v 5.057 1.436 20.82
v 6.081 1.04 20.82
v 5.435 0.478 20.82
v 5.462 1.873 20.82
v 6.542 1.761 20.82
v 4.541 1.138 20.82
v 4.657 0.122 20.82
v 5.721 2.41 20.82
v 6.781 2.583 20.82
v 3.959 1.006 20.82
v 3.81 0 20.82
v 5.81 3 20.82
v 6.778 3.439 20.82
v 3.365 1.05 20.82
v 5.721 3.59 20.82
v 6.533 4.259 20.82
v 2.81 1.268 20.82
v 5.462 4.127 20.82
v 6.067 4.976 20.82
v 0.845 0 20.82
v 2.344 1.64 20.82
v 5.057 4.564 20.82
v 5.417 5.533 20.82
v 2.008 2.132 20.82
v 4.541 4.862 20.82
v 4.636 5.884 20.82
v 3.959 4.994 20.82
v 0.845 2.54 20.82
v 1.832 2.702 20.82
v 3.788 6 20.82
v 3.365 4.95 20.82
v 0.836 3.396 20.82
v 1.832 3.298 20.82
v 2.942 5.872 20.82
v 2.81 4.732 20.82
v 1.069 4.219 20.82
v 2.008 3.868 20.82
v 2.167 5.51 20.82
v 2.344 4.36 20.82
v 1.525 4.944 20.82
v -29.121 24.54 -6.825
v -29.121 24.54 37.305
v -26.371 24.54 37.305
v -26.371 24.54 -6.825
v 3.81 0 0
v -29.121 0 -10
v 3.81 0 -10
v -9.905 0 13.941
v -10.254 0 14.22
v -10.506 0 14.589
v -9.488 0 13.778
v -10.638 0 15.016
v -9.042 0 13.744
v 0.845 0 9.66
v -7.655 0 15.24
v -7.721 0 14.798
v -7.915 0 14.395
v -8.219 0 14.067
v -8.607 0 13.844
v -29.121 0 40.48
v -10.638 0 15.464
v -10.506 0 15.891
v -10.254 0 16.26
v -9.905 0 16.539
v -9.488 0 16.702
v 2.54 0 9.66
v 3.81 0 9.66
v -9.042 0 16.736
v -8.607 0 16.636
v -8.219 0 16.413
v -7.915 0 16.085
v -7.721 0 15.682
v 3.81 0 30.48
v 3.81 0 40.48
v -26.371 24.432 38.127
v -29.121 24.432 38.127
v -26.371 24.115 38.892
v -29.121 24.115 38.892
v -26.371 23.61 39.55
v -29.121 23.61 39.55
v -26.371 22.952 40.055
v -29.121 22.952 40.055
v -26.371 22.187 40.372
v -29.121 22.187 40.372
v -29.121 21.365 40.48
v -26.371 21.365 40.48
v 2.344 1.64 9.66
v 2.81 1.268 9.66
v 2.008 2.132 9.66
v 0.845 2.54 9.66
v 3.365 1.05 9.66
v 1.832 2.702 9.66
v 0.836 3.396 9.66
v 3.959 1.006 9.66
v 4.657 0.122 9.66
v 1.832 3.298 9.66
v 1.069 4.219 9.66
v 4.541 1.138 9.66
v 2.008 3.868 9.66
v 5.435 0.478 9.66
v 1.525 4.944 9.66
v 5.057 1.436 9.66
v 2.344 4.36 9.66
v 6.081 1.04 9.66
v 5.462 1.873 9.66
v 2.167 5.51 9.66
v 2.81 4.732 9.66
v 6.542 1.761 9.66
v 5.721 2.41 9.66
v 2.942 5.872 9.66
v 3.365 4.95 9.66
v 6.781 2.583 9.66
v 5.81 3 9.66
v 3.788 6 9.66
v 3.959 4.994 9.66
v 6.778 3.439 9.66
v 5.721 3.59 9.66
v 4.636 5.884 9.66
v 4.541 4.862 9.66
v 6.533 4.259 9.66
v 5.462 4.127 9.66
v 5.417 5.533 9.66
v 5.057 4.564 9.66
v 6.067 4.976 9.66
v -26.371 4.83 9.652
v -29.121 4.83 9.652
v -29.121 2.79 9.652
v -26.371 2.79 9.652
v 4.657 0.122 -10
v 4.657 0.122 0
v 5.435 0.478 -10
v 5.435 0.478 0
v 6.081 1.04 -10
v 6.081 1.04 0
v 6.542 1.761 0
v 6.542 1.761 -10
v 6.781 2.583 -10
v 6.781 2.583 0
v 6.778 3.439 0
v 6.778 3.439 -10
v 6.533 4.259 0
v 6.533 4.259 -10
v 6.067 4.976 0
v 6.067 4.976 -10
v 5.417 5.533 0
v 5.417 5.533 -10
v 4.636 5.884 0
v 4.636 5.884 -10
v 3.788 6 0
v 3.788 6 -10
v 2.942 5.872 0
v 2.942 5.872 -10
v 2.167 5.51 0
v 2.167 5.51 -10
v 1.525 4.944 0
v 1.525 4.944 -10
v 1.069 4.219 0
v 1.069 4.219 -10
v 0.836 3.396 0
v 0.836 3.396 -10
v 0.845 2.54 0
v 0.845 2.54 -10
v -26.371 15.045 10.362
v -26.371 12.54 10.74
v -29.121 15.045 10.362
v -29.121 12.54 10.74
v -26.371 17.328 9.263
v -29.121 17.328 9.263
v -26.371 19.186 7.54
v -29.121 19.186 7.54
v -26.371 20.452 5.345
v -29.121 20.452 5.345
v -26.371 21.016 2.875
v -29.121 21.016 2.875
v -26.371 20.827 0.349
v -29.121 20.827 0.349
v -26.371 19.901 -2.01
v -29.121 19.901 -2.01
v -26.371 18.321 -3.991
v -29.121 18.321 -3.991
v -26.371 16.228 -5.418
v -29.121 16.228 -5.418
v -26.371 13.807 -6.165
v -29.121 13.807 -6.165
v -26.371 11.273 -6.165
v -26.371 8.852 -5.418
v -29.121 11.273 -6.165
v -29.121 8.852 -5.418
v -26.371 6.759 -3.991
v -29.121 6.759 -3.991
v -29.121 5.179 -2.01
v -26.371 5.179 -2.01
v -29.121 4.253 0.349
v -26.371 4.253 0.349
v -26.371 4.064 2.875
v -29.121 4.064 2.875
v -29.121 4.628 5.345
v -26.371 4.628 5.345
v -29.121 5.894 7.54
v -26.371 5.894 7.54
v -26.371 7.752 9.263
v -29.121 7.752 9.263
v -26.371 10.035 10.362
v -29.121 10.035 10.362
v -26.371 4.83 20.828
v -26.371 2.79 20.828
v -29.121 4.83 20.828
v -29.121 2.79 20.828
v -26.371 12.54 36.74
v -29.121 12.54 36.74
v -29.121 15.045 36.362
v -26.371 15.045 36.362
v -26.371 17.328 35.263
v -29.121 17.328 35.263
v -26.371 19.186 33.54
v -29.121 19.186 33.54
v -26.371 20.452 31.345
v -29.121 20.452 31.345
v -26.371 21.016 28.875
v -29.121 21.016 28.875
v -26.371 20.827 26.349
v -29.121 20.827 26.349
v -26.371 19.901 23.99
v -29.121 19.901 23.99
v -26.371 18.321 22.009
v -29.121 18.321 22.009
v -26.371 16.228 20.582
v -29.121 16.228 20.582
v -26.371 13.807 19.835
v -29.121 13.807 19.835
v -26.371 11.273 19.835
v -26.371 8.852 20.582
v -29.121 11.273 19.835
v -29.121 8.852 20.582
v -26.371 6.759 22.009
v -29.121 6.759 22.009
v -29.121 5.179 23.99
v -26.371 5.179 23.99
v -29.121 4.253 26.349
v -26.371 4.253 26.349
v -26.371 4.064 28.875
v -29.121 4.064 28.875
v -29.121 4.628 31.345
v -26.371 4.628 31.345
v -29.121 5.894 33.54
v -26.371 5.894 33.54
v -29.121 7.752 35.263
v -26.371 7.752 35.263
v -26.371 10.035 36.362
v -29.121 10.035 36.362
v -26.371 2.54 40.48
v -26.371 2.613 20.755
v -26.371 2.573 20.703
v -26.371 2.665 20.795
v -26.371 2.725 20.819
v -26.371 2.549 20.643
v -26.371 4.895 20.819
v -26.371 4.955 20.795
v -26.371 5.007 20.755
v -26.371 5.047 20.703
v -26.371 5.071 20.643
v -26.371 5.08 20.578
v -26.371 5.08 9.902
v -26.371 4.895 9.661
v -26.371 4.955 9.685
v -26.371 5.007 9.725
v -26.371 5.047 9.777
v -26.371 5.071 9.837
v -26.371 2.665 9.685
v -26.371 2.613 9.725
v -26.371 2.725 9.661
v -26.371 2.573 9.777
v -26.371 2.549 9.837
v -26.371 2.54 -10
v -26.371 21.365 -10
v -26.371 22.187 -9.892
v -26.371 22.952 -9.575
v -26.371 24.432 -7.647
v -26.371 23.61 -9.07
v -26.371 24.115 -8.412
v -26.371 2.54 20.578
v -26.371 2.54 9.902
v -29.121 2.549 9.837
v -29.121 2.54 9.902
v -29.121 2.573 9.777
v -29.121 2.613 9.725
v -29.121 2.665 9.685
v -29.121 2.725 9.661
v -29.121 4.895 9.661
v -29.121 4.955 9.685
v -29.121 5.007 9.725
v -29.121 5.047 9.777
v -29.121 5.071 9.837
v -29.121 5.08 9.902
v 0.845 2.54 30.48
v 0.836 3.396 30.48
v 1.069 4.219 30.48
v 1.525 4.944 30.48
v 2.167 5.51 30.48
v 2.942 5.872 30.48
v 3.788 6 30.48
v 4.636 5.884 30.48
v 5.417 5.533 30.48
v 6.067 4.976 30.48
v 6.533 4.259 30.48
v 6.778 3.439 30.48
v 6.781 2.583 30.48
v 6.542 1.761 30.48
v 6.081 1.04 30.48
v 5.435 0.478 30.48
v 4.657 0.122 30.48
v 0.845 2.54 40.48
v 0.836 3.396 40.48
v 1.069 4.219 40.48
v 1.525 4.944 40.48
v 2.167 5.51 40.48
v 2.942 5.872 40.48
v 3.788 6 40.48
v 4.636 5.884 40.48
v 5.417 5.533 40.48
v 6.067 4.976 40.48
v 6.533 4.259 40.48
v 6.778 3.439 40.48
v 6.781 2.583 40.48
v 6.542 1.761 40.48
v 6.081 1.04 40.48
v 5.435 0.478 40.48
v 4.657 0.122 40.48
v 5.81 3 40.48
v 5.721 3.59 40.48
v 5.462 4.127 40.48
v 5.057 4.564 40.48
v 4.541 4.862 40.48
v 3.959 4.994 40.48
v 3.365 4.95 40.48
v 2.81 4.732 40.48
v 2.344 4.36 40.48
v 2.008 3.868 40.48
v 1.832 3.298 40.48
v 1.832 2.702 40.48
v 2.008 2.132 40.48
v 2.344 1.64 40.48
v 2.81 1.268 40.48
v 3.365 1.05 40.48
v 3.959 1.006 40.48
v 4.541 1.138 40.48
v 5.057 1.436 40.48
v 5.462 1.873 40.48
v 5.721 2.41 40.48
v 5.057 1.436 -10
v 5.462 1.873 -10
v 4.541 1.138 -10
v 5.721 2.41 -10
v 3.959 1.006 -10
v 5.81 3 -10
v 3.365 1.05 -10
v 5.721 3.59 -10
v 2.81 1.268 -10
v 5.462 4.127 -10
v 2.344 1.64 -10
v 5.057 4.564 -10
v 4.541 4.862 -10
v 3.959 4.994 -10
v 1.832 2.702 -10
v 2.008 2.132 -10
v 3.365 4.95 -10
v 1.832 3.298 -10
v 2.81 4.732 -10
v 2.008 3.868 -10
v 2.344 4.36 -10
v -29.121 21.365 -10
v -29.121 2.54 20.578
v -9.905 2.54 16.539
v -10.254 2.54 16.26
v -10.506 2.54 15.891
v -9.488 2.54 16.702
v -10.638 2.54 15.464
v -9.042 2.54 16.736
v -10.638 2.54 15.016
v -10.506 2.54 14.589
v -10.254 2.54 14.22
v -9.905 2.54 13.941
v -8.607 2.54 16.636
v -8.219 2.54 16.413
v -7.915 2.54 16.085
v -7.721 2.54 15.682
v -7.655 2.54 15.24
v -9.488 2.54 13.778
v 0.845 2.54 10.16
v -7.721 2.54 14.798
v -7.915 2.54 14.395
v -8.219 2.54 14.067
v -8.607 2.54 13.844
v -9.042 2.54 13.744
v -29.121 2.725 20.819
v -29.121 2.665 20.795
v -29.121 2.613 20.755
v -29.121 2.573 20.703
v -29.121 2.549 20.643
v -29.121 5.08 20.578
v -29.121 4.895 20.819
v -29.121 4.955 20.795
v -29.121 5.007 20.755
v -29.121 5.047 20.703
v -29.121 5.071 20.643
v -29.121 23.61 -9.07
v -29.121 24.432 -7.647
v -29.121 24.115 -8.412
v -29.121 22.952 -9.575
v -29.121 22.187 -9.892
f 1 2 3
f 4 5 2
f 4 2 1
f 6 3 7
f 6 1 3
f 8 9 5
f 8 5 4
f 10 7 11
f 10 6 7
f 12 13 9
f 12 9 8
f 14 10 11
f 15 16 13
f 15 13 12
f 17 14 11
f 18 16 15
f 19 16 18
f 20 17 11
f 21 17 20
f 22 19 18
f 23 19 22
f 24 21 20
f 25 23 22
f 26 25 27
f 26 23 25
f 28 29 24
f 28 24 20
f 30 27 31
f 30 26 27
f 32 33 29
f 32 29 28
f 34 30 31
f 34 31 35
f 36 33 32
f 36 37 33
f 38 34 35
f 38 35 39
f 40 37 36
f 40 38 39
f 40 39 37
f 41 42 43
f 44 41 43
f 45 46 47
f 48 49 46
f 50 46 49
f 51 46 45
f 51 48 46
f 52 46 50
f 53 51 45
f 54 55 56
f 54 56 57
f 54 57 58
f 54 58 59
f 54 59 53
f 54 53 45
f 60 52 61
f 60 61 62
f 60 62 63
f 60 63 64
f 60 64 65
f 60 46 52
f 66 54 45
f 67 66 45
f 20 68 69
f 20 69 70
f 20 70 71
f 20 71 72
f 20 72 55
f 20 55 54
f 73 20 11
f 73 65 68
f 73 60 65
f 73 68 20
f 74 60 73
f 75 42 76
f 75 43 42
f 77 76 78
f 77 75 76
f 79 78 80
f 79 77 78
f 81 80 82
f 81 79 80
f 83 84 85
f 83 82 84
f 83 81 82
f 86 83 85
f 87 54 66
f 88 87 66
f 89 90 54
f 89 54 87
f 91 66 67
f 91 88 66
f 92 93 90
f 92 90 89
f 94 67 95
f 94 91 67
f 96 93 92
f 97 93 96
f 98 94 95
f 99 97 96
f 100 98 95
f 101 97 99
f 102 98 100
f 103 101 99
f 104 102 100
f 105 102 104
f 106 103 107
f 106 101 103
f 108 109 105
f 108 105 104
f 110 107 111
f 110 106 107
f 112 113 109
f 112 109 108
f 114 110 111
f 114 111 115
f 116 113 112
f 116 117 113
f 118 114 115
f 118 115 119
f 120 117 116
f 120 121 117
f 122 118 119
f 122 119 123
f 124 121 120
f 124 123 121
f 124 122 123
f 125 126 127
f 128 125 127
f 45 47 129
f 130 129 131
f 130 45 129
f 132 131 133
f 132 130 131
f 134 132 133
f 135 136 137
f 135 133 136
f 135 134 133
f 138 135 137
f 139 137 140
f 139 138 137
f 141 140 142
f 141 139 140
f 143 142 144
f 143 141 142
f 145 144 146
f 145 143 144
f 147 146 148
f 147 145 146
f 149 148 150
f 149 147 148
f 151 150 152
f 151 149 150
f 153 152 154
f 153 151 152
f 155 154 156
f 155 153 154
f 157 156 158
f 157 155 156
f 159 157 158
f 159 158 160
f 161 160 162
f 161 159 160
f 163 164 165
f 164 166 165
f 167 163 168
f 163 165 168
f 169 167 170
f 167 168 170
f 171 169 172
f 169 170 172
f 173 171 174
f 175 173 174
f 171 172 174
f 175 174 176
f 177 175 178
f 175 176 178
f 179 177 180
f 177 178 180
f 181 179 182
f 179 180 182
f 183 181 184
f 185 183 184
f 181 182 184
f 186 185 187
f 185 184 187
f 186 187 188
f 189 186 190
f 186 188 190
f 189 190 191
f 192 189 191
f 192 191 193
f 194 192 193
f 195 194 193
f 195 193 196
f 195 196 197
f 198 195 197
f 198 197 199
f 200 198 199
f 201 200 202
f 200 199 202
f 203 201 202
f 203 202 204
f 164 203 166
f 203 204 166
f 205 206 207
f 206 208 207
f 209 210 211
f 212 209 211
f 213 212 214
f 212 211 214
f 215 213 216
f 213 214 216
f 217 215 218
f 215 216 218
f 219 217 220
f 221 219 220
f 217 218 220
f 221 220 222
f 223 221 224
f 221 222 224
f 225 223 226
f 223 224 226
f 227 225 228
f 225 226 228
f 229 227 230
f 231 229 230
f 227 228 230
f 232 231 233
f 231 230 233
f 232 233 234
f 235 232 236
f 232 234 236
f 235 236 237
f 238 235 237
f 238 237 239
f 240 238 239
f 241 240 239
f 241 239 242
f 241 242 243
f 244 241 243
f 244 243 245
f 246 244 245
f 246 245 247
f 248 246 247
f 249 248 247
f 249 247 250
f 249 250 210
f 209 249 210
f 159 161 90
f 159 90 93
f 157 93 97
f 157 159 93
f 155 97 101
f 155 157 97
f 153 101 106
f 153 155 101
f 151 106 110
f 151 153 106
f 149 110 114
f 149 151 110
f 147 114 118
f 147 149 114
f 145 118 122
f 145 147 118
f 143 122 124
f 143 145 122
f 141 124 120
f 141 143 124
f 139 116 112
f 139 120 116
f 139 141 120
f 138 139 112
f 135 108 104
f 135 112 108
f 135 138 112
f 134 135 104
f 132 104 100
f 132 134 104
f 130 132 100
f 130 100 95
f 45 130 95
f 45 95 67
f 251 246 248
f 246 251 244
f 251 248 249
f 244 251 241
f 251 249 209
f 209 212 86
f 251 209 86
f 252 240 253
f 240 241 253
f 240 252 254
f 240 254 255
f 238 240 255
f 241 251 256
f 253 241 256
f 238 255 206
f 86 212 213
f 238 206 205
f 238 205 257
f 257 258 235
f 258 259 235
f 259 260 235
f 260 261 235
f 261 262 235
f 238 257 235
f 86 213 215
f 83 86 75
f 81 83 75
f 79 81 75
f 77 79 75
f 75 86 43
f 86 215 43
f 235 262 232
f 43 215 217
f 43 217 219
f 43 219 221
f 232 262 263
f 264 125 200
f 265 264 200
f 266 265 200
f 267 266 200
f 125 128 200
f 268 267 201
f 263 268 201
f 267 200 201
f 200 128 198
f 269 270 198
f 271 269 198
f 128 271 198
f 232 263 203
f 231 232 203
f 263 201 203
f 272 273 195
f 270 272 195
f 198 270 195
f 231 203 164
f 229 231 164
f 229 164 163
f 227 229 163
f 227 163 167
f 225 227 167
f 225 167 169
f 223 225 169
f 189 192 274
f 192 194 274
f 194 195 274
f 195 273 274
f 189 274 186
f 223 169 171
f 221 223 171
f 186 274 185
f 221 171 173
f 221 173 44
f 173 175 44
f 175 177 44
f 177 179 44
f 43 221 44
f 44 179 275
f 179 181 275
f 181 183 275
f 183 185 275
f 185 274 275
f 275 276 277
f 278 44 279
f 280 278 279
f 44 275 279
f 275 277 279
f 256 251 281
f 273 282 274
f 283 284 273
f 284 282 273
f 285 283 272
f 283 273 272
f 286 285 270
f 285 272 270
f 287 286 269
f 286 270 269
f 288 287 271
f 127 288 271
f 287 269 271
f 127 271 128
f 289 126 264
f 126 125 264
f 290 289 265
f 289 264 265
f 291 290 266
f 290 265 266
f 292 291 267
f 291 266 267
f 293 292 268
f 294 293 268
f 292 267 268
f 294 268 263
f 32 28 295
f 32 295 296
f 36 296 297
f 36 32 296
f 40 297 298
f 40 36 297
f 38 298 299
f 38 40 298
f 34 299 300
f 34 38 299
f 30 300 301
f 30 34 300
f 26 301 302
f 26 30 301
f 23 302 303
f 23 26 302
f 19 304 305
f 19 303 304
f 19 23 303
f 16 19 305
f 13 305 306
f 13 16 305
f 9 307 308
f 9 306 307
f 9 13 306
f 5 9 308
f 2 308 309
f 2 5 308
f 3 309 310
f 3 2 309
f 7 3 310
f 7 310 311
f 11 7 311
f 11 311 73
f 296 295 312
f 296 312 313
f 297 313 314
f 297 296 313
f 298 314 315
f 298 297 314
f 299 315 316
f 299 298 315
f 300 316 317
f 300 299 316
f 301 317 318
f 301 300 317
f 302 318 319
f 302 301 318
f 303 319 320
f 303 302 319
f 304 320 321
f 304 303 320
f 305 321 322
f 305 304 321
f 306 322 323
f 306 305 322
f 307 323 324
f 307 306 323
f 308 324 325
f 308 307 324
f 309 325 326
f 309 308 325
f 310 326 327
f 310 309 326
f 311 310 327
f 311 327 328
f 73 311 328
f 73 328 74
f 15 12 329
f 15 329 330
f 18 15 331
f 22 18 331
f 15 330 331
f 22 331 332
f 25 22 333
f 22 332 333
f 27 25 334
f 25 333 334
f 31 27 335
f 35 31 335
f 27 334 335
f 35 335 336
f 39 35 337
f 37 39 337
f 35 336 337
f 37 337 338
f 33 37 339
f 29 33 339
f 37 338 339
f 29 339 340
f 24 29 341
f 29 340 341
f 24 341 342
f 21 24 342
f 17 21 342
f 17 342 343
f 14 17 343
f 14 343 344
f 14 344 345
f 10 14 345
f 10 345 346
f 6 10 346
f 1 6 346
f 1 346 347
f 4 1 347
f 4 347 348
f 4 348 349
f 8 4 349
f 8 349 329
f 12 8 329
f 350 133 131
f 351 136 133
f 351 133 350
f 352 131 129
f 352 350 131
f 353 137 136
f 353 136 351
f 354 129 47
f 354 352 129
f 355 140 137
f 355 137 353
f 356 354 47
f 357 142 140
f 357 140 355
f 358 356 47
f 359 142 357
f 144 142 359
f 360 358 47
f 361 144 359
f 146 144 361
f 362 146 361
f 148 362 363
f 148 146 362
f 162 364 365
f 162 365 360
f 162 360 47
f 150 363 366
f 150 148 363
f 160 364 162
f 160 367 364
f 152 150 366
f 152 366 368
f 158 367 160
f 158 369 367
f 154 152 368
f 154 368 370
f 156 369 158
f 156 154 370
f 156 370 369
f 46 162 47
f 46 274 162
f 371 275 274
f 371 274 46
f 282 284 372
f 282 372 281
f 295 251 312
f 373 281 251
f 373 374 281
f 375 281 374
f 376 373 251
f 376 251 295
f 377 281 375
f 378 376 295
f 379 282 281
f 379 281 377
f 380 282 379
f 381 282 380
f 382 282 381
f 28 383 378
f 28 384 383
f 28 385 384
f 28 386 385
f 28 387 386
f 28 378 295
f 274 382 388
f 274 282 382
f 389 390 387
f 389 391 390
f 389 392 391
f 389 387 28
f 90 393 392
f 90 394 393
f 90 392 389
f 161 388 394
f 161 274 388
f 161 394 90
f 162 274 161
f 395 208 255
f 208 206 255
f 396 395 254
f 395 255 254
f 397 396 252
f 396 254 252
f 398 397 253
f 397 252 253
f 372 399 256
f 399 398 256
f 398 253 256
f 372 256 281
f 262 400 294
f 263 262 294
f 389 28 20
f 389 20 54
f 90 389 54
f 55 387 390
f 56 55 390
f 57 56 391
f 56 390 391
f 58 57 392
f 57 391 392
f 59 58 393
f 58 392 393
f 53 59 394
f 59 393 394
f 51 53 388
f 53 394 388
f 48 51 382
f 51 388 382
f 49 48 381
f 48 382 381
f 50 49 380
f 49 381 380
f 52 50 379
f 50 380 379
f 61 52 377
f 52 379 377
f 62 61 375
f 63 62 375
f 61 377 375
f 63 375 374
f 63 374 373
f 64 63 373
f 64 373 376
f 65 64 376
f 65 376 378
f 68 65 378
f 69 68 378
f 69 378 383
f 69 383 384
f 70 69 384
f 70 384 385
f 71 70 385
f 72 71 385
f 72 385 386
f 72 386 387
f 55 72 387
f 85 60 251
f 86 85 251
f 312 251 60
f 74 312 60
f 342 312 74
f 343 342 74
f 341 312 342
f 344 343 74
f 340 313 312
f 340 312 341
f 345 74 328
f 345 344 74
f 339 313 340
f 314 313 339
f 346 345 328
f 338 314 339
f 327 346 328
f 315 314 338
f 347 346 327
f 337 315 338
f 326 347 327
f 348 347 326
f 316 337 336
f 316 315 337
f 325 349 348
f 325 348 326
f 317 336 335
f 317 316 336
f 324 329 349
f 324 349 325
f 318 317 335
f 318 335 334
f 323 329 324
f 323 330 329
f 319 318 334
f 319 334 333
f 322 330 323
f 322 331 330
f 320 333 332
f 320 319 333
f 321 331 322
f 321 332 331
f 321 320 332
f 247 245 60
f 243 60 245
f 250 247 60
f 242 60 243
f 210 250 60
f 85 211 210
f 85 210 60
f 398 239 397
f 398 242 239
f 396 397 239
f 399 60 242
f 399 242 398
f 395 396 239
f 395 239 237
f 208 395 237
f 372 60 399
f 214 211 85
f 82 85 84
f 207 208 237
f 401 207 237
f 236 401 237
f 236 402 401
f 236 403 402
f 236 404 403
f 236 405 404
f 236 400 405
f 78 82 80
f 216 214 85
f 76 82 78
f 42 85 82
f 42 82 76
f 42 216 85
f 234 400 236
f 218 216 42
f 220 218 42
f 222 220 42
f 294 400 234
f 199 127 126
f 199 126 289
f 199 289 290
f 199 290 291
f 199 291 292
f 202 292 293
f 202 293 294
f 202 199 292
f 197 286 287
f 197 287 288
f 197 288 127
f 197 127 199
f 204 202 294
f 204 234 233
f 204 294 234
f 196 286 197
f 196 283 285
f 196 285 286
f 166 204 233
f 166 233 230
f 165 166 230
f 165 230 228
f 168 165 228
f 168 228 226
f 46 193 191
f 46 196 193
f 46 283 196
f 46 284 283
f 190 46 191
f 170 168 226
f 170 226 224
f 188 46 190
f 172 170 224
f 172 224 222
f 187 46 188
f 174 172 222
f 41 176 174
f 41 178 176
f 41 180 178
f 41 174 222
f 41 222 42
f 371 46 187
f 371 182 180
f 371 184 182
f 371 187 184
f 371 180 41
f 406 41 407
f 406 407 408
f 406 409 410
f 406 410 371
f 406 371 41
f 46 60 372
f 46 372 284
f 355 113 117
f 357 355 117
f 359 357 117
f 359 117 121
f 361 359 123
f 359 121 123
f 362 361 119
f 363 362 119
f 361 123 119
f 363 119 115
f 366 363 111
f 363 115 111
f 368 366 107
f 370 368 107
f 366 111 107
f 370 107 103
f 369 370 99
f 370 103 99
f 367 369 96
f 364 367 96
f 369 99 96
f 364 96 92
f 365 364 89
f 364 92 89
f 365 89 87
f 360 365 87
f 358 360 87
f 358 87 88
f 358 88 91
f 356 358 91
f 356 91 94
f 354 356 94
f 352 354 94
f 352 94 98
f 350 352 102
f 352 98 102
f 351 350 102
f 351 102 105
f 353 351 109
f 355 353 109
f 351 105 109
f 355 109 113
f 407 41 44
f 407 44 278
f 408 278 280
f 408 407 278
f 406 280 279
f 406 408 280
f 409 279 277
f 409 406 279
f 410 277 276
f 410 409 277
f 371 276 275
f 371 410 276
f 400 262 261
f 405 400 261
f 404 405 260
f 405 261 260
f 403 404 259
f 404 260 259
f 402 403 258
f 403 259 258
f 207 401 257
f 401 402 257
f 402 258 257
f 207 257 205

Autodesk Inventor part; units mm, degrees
ref_plane "YZ Plane" through (0, 0, 0) normal (1, 0, 0) x (0, 1, 0)
ref_plane "XZ Plane" through (0, 0, 0) normal (0, 1, 0) x (-1, 0, 0)
ref_plane "XY Plane" through (0, 0, 0) normal (0, 0, 1) x (1, 0, 0)
sketch "Sketch1" plane through (0, 0, 0) normal (0, 0, 1) x (1, 0, 0)
  line L0 (0, 0) -> (3.81, 0)
  line L1 (0, 0) -> (0, 1.27)
  arc A0 (3.81, 0) -> (1.359061, 1.27) centre (3.81, 3) ccw
  circle A1 centre (3.81, 3) radius 1.9
  line L2 (0, 1.27) -> (1.359061, 1.27)
  dimension "d0" = 3.81
  dimension "d1" = 1.27
  dimension "d2" = 6
  dimension "d3" = 3.8
extrude "Extrusion1" add sketch "Sketch1" along normal blind 30.48
ref_plane "Work Plane1" through (0, 0, 20.32) normal (0, 0, 1) x (1, 0, 0)
sketch "Sketch2" plane through (0, 0, 20.32) normal (0, 0, 1) x (1, 0, 0)
  arc A0 (3.81, 0) -> (1.359061, 1.27) centre (3.81, 3) ccw
  line L0 (2.54, 1.27) -> (2.54, 0)
  line L1 (0, 0) -> (3.81, 0)
  line L2 (2.54, 0) -> (3.81, 0)
  circle A1 centre (3.81, 3) radius 0.762
sketch "Sketch2 outline for Extrusion2" plane through (0, 0, 20.32) normal (0, 0, 1) x (1, 0, 0)
  line L0 (2.54, 0) -> (3.81, 0)
  line L1 (1.359061, 1.27) -> (2.54, 0)
  arc A0 (3.81, 0) -> (1.359061, 1.27) centre (3.81, 3) ccw
  circle A1 centre (3.81, 3) radius 0.762
extrude "Extrusion2" cut sketch "Sketch2 outline for Extrusion2" against normal blind 10.16
sketch "Sketch3" plane through (0, 1.27, 0) normal (0, 1, 0) x (1, 0, 0)
  line L0 (0, 0) -> (3.81, 0)
  line L1 (0, 0) -> (2.531995, 0)
  line L2 (2.531995, 0) -> (-25.408005, 0)
  line L3 (-25.408005, 0) -> (-25.408005, -27.94)
  line L4 (-25.408005, -27.94) -> (2.531995, -27.94)
  line L5 (1.359061, 0) -> (1.359061, -10.16)
  line L6 (1.359061, 0) -> (1.359061, -1.27)
  line L7 (1.359061, -1.27) -> (-25.310939, -1.27)
  line L8 (1.359061, -20.32) -> (1.359061, -30.48)
  line L9 (1.359061, -30.48) -> (1.359061, -29.21)
  line L10 (1.359061, -29.21) -> (-25.310939, -29.21)
  line L11 (-25.310939, -29.21) -> (-25.310939, -1.27)
  line L12 (0.085059, -1.27) -> (0.085059, -29.21)
  line L13 (0, 0) -> (0, -30.48)
  line L14 (0, -1.27) -> (0, -29.21)
  line L15 (1.359061, -29.21) -> (1.359061, -30.48)
  line L16 (1.359061, 0) -> (1.359061, -1.27)
  line L17 (1.359061, -30.48) -> (1.359061, -29.21)
  line L18 (1.359061, -30.48) -> (6.81, -30.48)
  line L19 (1.359061, -30.48) -> (-1.399798, -27.94)
  line L20 (1.359061, -30.48) -> (1.359061, -29.21)
  line L21 (1.359061, -29.21) -> (-1.466488, -29.21)
  point P0 (3.81, -30.48)
  dimension "d9" = 27.94
  dimension "d10" = 27.94
  dimension "d11" = 27.94
  dimension "d12" = 1.27
  dimension "d13" = 26.67
  dimension "d14" = 1.27
  dimension "d15" = 26.67
extrude "Extrusion3" cut sketch "Sketch3" against normal blind 25.4 contours L7 L12 L4 L13 | L4 L12 L10 L13
sketch "Sketch4" plane through (0, 0, 0) normal (0, -1, 0) x (1, 0, 0)
  line L0 (1.359061, 0) -> (1.359061, 10.16)
  line L1 (1.359061, 0) -> (-29.120939, 0)
  line L2 (-29.120939, 0) -> (-29.120939, 30.48)
  line L3 (-29.120939, 30.48) -> (1.359061, 30.48)
  line L4 (1.359061, 30.48) -> (1.359061, 0)
  line L5 (0, 1.27) -> (0.085059, 1.27)
  line L6 (0.085059, 1.27) -> (-27.854941, 1.27)
  line L7 (-27.854941, 1.27) -> (-27.854941, 29.21)
  line L8 (-27.854941, 29.21) -> (0.085059, 29.21)
  line L9 (0.085059, 29.21) -> (0.085059, 1.27)
  point P0 (0, 0)
  dimension "d18" = 30.48
  dimension "d19" = 30.48
  dimension "d20" = 30.48
  dimension "d21" = 27.94
  dimension "d22" = 27.94
  dimension "d23" = 27.94
sketch "Sketch5" plane through (0, 1.27, 0) normal (0, 1, 0) x (1, 0, 0)
  line L0 (1.359061, 0) -> (0, 0)
  line L1 (1.359061, 0) -> (0, 0)
  line L2 (0, 0) -> (0, -1.27)
  line L3 (0, 0) -> (0, -1.27)
  line L4 (0, -1.27) -> (1.359061, -1.27)
  line L5 (1.359061, 0) -> (1.359061, -10.16)
  line L6 (0, -29.21) -> (0, -30.48)
  line L7 (0, -29.21) -> (2.54, -29.21)
  line L8 (2.54, -29.21) -> (2.54, -30.48)
  line L9 (2.54, -30.48) -> (0, -30.48)
  line L10 (0, -30.48) -> (0, -29.21)
extrude "Extrusion4" cut sketch "Sketch5" against normal blind 25.4
sketch "Sketch6" plane through (1.359061, 1.27, 20.32) normal (0, 1, 0) x (1, 0, 0)
  line L0 (0, 19.05) -> (0, 10.16)
  line L1 (0, 0) -> (0, 10.16)
  line L2 (0, 19.05) -> (0, -8.89)
  line L3 (-1.274003, -8.89) -> (-1.274003, 19.05)
  line L4 (0, -8.89) -> (-1.274003, -8.89)
  line L5 (-1.274003, -8.89) -> (-1.274003, 19.05)
  line L6 (-1.274003, 19.05) -> (0, 19.05)
  point P0 (-1.359061, 20.32)
extrude "Extrusion5" cut sketch "Sketch6" against normal blind 25.4
extrude "Extrusion6" add sketch "Sketch4" against normal blind 1.27
sketch "Sketch7" plane through (0, 1.27, 0) normal (0, 1, 0) x (1, 0, 0)
  line L0 (1.359061, -29.21) -> (1.359061, -30.48)
  line L1 (-29.120939, 0) -> (-29.120939, -30.48)
  line L2 (2.54, 0) -> (-29.120939, 0)
  line L3 (-29.120939, 0) -> (-29.120939, -30.48)
  line L4 (-29.120939, -30.48) -> (2.54, -30.48)
  line L5 (2.54, -30.48) -> (2.54, 0)
  point P0 (0, 0)
  point P1 (2.54, -9.31335)
extrude "Extrusion7" add sketch "Sketch7" along normal blind 1.27
sketch "Sketch8" plane through (0, 2.54, 0) normal (0, 1, 0) x (1, 0, 0)
  line L0 (-22.120939, 7.26) -> (-22.120939, -37.74)
  line L1 (-29.120939, 0) -> (-29.120939, -30.48)
  line L2 (-29.120939, 0) -> (-29.120939, -30.48)
  line L3 (-29.120939, 0) -> (-26.370939, 0)
  line L4 (-26.370939, 0) -> (-26.370939, -30.48)
  line L5 (-26.370939, -30.48) -> (-29.120939, -30.48)
  line L6 (-29.120939, -30.48) -> (-29.120939, 0)
  point P0 (0, 0)
  dimension "d32" = 2.75
extrude "Extrusion8" add sketch "Sketch8" along normal blind 22
sketch "Sketch9" plane through (0, 0, 0) normal (0, 0, -1) x (-1, 0, 0)
  arc A0 (-0.845476, 2.54) -> (-3.81, 0) centre (-3.81, 3) ccw
  line L0 (29.120939, 0) -> (-3.81, 0)
  line L1 (29.120939, 0) -> (29.120939, 24.54)
  line L2 (26.370939, 24.54) -> (29.120939, 24.54)
  line L3 (26.370939, 2.54) -> (26.370939, 24.54)
  line L4 (-0.845476, 2.54) -> (26.370939, 2.54)
  line L5 (-2.54, 1.586812) -> (-2.54, 2.54)
  arc A1 (-1.966525, 2.54) -> (-2.54, 1.586812) centre (-3.81, 3) ccw
  line L6 (-2.54, 2.54) -> (-1.966525, 2.54)
  point P0 (0, 0)
extrude "Extrusion9" add sketch "Sketch9" along normal blind 10
sketch "Sketch10" plane through (0, 0, 30.48) normal (0, 0, 1) x (1, 0, 0)
  line L0 (0.085059, 1.27) -> (-27.854941, 1.27)
  line L1 (-26.370939, 2.54) -> (2.54, 2.54)
  line L2 (2.54, 0) -> (3.81, 0)
  arc A0 (3.81, 0) -> (0.845476, 2.54) centre (3.81, 3) ccw
  line L3 (2.54, 1.586812) -> (2.54, 2.54)
  line L4 (1.966525, 2.54) -> (2.54, 2.54)
  line L5 (-26.370939, 2.54) -> (-26.370939, 24.54)
  line L6 (-29.120939, 24.54) -> (-26.370939, 24.54)
  line L7 (-29.120939, 0) -> (-29.120939, 24.54)
  arc A1 (2.54, 1.586812) -> (1.966525, 2.54) centre (3.81, 3) ccw
  line L8 (1.359061, 1.27) -> (2.54, 1.27)
  line L9 (2.54, 1.27) -> (2.54, 0)
  line L10 (-26.370939, 2.54) -> (0.845476, 2.54)
  line L11 (-29.120939, 0) -> (1.359061, 0)
  line L12 (1.359061, 0) -> (1.359061, 1.27)
  point P0 (0, 0)
extrude "Extrusion10" add sketch "Sketch10" along normal blind 10
fillet "Fillet1" radius 3.175 2 edges at (-27.7459, 24.54, -10) (-27.7459, 24.54, 40.48)
sketch "Sketch12" plane through (0, 0, 40.48) normal (0, 0, 1) x (1, 0, 0)
  line L0 (2.54, 1.27) -> (2.54, 0)
  line L1 (1.359061, 1.27) -> (2.54, 1.27)
  line L2 (1.359061, 1.27) -> (1.359061, 0)
  line L3 (2.54, 0) -> (1.359061, 0)
  line L4 (2.54, 1.27) -> (2.54, 0)
  line L5 (2.54, 1.27) -> (1.359061, 1.27)
  point P0 (0, 0)
extrude "Extrusion12" add sketch "Sketch12" against normal blind 12
sketch "Sketch13" plane through (0, 0, 40.48) normal (0, 0, 1) x (1, 0, 0)
  arc A0 (2.54, 1.586812) -> (1.966525, 2.54) centre (3.81, 3) ccw
  circle A1 centre (3.81, 3) radius 2
  point P0 (0, 0)
extrude "Extrusion13" cut sketch "Sketch13" against normal blind 5054.6
sketch "Sketch14" plane through (0, 0, 20.32) normal (0, 0, -1) x (-1, 0, 0)
  arc A0 (-1.863619, 2.54) -> (-2.54, 1.454976) centre (-3.81, 3) ccw
  line L0 (-1.863619, 2.54) -> (-0.845476, 2.54)
  arc A1 (-0.845476, 2.54) -> (-3.81, 0) centre (-3.81, 3) ccw
  line L1 (-2.54, 0) -> (-3.81, 0)
  line L2 (-1.359061, 1.27) -> (-2.54, 0)
  line L3 (-1.359061, 1.27) -> (-2.54, 1.27)
  line L4 (-2.54, 1.27) -> (-2.54, 1.454976)
  line L5 (-2.54, 1.27) -> (-2.54, 0)
  line L6 (-2.54, 1.27) -> (-1.359061, 1.27)
  line L7 (-0.845476, 2.54) -> (26.370939, 2.54)
  line L8 (-1.359061, 1.27) -> (-2.54, 0)
  point P0 (0, 0)
extrude "Extrusion14" add sketch "Sketch14" along normal blind 15 contours L3 L2 L5
sketch "Sketch15" plane through (0, 2.54, 0) normal (0, 1, 0) x (1, 0, 0)
  line L0 (0.845476, 10) -> (0.845476, -10.16)
  line L1 (1.81, -40.48) -> (1.81, 10)
  line L2 (0.845476, -10.16) -> (1.81, -10.16)
  line L3 (1.81, -10.16) -> (1.81, -20.32)
  line L4 (1.81, -20.32) -> (0.845476, -20.32)
  line L5 (0.845476, -20.32) -> (0.845476, -10.16)
  line L6 (0.845476, -10.16) -> (12.384081, -10.16)
  line L7 (12.384081, -10.16) -> (12.384081, -20.32)
  line L8 (12.384081, -20.32) -> (0.845476, -20.32)
  line L9 (0.845476, -20.32) -> (0.845476, -10.16)
  point P0 (0, 0)
extrude "Extrusion15" cut sketch "Sketch15" against normal blind 15
sketch "Sketch16" plane through (-29.120939, 0, -10) normal (-1, 0, 0) x (0, 0, 1)
  circle A0 centre (12.24, 12.54) radius 8 projected
  circle A1 centre (38.24, 12.54) radius 8 projected
  circle A2 centre (12.24, 12.54) radius 8.5
  circle A3 centre (38.24, 12.54) radius 8.5
  point P0 (10, 0)
  dimension "d54" = 17
  dimension "d55" = 17
extrude "Extrusion16" cut sketch "Sketch16" against normal blind 25.4 contours A0 | A1 | A2 | A3
sketch "Sketch17" plane through (0, 0, 10.16) normal (0, 0, 1) x (1, 0, 0)
  line L0 (3.81, 0) -> (0.845476, 0)
  arc A0 (3.81, 0) -> (0.845476, 2.54) centre (3.81, 3) ccw
  line L1 (0.845476, 2.54) -> (0.845476, 0)
  circle A1 centre (3.81, 3) radius 2
  point P0 (0, 0)
extrude "Extrusion17" cut sketch "Sketch17" against normal blind 0.5
sketch "Sketch18" plane through (0, 0, 20.32) normal (0, 0, -1) x (-1, 0, 0)
  circle A0 centre (-3.81, 3) radius 2
  line L0 (-0.845476, 0) -> (-3.81, 0)
  line L1 (-0.845476, 2.54) -> (-0.845476, 0)
  arc A1 (-0.845476, 2.54) -> (-3.81, 0) centre (-3.81, 3) ccw
  point P0 (0, 0)
extrude "Extrusion18" cut sketch "Sketch18" against normal blind 0.5
sketch "Sketch19" plane through (-29.120939, 0, -10) normal (0, -1, 0) x (1, 0, 0)
  line L0 (29.205997, 11.27) -> (1.265997, 11.27)
  line L1 (1.265997, 11.27) -> (1.265997, 39.21)
  line L2 (1.265997, 39.21) -> (29.205997, 39.21)
  line L3 (29.205997, 39.21) -> (29.205997, 11.27)
  point P0 (29.120939, 10)
extrude "Extrusion19" add sketch "Sketch19" against normal blind 2.032
sketch "Sketch20" plane through (-29.120939, 0, -10) normal (-1, 0, 0) x (0, 0, 1)
  line L0 (0, 2.54) -> (50.48, 2.54) projected
  line L1 (25.24, 2.54) -> (30.828, 2.54)
  line L2 (30.828, 2.54) -> (19.652, 2.54)
  line L3 (19.652, 2.54) -> (30.828, 2.54)
  line L4 (30.828, 2.54) -> (30.828, 5.08)
  line L5 (30.828, 5.08) -> (19.652, 5.08)
  line L6 (19.652, 5.08) -> (19.652, 2.54)
  point P0 (10, 0)
  dimension "d64" = 5.588
  dimension "d65" = 11.176
  dimension "d66" = 2.54
extrude "Extrusion20" cut sketch "Sketch20" against normal blind 25.4
fillet "Fillet2" radius 0.25 4 edges at (-27.7459, 5.08, 9.652) (-27.7459, 2.54, 9.652) (-27.7459, 2.54, 20.828) (-27.7459, 5.08, 20.828)
sketch "Sketch21" plane through (0, 2.54, 0) normal (0, 1, 0) x (1, 0, 0)
  line L0 (0.845476, -9.66) -> (0.845476, -20.82)
  line L1 (0.845476, -15.24) -> (-4.154524, -15.24)
  line L2 (-4.154524, -15.24) -> (-9.154524, -15.24)
  circle A0 centre (-9.154524, -15.24) radius 1.5
  point P0 (0, 0)
  dimension "d70" = 5
  dimension "d71" = 5
  dimension "d72" = 3
extrude "Extrusion21" cut sketch "Sketch21" against normal blind 25.4
properties part number "Lid, Explosion Button"
